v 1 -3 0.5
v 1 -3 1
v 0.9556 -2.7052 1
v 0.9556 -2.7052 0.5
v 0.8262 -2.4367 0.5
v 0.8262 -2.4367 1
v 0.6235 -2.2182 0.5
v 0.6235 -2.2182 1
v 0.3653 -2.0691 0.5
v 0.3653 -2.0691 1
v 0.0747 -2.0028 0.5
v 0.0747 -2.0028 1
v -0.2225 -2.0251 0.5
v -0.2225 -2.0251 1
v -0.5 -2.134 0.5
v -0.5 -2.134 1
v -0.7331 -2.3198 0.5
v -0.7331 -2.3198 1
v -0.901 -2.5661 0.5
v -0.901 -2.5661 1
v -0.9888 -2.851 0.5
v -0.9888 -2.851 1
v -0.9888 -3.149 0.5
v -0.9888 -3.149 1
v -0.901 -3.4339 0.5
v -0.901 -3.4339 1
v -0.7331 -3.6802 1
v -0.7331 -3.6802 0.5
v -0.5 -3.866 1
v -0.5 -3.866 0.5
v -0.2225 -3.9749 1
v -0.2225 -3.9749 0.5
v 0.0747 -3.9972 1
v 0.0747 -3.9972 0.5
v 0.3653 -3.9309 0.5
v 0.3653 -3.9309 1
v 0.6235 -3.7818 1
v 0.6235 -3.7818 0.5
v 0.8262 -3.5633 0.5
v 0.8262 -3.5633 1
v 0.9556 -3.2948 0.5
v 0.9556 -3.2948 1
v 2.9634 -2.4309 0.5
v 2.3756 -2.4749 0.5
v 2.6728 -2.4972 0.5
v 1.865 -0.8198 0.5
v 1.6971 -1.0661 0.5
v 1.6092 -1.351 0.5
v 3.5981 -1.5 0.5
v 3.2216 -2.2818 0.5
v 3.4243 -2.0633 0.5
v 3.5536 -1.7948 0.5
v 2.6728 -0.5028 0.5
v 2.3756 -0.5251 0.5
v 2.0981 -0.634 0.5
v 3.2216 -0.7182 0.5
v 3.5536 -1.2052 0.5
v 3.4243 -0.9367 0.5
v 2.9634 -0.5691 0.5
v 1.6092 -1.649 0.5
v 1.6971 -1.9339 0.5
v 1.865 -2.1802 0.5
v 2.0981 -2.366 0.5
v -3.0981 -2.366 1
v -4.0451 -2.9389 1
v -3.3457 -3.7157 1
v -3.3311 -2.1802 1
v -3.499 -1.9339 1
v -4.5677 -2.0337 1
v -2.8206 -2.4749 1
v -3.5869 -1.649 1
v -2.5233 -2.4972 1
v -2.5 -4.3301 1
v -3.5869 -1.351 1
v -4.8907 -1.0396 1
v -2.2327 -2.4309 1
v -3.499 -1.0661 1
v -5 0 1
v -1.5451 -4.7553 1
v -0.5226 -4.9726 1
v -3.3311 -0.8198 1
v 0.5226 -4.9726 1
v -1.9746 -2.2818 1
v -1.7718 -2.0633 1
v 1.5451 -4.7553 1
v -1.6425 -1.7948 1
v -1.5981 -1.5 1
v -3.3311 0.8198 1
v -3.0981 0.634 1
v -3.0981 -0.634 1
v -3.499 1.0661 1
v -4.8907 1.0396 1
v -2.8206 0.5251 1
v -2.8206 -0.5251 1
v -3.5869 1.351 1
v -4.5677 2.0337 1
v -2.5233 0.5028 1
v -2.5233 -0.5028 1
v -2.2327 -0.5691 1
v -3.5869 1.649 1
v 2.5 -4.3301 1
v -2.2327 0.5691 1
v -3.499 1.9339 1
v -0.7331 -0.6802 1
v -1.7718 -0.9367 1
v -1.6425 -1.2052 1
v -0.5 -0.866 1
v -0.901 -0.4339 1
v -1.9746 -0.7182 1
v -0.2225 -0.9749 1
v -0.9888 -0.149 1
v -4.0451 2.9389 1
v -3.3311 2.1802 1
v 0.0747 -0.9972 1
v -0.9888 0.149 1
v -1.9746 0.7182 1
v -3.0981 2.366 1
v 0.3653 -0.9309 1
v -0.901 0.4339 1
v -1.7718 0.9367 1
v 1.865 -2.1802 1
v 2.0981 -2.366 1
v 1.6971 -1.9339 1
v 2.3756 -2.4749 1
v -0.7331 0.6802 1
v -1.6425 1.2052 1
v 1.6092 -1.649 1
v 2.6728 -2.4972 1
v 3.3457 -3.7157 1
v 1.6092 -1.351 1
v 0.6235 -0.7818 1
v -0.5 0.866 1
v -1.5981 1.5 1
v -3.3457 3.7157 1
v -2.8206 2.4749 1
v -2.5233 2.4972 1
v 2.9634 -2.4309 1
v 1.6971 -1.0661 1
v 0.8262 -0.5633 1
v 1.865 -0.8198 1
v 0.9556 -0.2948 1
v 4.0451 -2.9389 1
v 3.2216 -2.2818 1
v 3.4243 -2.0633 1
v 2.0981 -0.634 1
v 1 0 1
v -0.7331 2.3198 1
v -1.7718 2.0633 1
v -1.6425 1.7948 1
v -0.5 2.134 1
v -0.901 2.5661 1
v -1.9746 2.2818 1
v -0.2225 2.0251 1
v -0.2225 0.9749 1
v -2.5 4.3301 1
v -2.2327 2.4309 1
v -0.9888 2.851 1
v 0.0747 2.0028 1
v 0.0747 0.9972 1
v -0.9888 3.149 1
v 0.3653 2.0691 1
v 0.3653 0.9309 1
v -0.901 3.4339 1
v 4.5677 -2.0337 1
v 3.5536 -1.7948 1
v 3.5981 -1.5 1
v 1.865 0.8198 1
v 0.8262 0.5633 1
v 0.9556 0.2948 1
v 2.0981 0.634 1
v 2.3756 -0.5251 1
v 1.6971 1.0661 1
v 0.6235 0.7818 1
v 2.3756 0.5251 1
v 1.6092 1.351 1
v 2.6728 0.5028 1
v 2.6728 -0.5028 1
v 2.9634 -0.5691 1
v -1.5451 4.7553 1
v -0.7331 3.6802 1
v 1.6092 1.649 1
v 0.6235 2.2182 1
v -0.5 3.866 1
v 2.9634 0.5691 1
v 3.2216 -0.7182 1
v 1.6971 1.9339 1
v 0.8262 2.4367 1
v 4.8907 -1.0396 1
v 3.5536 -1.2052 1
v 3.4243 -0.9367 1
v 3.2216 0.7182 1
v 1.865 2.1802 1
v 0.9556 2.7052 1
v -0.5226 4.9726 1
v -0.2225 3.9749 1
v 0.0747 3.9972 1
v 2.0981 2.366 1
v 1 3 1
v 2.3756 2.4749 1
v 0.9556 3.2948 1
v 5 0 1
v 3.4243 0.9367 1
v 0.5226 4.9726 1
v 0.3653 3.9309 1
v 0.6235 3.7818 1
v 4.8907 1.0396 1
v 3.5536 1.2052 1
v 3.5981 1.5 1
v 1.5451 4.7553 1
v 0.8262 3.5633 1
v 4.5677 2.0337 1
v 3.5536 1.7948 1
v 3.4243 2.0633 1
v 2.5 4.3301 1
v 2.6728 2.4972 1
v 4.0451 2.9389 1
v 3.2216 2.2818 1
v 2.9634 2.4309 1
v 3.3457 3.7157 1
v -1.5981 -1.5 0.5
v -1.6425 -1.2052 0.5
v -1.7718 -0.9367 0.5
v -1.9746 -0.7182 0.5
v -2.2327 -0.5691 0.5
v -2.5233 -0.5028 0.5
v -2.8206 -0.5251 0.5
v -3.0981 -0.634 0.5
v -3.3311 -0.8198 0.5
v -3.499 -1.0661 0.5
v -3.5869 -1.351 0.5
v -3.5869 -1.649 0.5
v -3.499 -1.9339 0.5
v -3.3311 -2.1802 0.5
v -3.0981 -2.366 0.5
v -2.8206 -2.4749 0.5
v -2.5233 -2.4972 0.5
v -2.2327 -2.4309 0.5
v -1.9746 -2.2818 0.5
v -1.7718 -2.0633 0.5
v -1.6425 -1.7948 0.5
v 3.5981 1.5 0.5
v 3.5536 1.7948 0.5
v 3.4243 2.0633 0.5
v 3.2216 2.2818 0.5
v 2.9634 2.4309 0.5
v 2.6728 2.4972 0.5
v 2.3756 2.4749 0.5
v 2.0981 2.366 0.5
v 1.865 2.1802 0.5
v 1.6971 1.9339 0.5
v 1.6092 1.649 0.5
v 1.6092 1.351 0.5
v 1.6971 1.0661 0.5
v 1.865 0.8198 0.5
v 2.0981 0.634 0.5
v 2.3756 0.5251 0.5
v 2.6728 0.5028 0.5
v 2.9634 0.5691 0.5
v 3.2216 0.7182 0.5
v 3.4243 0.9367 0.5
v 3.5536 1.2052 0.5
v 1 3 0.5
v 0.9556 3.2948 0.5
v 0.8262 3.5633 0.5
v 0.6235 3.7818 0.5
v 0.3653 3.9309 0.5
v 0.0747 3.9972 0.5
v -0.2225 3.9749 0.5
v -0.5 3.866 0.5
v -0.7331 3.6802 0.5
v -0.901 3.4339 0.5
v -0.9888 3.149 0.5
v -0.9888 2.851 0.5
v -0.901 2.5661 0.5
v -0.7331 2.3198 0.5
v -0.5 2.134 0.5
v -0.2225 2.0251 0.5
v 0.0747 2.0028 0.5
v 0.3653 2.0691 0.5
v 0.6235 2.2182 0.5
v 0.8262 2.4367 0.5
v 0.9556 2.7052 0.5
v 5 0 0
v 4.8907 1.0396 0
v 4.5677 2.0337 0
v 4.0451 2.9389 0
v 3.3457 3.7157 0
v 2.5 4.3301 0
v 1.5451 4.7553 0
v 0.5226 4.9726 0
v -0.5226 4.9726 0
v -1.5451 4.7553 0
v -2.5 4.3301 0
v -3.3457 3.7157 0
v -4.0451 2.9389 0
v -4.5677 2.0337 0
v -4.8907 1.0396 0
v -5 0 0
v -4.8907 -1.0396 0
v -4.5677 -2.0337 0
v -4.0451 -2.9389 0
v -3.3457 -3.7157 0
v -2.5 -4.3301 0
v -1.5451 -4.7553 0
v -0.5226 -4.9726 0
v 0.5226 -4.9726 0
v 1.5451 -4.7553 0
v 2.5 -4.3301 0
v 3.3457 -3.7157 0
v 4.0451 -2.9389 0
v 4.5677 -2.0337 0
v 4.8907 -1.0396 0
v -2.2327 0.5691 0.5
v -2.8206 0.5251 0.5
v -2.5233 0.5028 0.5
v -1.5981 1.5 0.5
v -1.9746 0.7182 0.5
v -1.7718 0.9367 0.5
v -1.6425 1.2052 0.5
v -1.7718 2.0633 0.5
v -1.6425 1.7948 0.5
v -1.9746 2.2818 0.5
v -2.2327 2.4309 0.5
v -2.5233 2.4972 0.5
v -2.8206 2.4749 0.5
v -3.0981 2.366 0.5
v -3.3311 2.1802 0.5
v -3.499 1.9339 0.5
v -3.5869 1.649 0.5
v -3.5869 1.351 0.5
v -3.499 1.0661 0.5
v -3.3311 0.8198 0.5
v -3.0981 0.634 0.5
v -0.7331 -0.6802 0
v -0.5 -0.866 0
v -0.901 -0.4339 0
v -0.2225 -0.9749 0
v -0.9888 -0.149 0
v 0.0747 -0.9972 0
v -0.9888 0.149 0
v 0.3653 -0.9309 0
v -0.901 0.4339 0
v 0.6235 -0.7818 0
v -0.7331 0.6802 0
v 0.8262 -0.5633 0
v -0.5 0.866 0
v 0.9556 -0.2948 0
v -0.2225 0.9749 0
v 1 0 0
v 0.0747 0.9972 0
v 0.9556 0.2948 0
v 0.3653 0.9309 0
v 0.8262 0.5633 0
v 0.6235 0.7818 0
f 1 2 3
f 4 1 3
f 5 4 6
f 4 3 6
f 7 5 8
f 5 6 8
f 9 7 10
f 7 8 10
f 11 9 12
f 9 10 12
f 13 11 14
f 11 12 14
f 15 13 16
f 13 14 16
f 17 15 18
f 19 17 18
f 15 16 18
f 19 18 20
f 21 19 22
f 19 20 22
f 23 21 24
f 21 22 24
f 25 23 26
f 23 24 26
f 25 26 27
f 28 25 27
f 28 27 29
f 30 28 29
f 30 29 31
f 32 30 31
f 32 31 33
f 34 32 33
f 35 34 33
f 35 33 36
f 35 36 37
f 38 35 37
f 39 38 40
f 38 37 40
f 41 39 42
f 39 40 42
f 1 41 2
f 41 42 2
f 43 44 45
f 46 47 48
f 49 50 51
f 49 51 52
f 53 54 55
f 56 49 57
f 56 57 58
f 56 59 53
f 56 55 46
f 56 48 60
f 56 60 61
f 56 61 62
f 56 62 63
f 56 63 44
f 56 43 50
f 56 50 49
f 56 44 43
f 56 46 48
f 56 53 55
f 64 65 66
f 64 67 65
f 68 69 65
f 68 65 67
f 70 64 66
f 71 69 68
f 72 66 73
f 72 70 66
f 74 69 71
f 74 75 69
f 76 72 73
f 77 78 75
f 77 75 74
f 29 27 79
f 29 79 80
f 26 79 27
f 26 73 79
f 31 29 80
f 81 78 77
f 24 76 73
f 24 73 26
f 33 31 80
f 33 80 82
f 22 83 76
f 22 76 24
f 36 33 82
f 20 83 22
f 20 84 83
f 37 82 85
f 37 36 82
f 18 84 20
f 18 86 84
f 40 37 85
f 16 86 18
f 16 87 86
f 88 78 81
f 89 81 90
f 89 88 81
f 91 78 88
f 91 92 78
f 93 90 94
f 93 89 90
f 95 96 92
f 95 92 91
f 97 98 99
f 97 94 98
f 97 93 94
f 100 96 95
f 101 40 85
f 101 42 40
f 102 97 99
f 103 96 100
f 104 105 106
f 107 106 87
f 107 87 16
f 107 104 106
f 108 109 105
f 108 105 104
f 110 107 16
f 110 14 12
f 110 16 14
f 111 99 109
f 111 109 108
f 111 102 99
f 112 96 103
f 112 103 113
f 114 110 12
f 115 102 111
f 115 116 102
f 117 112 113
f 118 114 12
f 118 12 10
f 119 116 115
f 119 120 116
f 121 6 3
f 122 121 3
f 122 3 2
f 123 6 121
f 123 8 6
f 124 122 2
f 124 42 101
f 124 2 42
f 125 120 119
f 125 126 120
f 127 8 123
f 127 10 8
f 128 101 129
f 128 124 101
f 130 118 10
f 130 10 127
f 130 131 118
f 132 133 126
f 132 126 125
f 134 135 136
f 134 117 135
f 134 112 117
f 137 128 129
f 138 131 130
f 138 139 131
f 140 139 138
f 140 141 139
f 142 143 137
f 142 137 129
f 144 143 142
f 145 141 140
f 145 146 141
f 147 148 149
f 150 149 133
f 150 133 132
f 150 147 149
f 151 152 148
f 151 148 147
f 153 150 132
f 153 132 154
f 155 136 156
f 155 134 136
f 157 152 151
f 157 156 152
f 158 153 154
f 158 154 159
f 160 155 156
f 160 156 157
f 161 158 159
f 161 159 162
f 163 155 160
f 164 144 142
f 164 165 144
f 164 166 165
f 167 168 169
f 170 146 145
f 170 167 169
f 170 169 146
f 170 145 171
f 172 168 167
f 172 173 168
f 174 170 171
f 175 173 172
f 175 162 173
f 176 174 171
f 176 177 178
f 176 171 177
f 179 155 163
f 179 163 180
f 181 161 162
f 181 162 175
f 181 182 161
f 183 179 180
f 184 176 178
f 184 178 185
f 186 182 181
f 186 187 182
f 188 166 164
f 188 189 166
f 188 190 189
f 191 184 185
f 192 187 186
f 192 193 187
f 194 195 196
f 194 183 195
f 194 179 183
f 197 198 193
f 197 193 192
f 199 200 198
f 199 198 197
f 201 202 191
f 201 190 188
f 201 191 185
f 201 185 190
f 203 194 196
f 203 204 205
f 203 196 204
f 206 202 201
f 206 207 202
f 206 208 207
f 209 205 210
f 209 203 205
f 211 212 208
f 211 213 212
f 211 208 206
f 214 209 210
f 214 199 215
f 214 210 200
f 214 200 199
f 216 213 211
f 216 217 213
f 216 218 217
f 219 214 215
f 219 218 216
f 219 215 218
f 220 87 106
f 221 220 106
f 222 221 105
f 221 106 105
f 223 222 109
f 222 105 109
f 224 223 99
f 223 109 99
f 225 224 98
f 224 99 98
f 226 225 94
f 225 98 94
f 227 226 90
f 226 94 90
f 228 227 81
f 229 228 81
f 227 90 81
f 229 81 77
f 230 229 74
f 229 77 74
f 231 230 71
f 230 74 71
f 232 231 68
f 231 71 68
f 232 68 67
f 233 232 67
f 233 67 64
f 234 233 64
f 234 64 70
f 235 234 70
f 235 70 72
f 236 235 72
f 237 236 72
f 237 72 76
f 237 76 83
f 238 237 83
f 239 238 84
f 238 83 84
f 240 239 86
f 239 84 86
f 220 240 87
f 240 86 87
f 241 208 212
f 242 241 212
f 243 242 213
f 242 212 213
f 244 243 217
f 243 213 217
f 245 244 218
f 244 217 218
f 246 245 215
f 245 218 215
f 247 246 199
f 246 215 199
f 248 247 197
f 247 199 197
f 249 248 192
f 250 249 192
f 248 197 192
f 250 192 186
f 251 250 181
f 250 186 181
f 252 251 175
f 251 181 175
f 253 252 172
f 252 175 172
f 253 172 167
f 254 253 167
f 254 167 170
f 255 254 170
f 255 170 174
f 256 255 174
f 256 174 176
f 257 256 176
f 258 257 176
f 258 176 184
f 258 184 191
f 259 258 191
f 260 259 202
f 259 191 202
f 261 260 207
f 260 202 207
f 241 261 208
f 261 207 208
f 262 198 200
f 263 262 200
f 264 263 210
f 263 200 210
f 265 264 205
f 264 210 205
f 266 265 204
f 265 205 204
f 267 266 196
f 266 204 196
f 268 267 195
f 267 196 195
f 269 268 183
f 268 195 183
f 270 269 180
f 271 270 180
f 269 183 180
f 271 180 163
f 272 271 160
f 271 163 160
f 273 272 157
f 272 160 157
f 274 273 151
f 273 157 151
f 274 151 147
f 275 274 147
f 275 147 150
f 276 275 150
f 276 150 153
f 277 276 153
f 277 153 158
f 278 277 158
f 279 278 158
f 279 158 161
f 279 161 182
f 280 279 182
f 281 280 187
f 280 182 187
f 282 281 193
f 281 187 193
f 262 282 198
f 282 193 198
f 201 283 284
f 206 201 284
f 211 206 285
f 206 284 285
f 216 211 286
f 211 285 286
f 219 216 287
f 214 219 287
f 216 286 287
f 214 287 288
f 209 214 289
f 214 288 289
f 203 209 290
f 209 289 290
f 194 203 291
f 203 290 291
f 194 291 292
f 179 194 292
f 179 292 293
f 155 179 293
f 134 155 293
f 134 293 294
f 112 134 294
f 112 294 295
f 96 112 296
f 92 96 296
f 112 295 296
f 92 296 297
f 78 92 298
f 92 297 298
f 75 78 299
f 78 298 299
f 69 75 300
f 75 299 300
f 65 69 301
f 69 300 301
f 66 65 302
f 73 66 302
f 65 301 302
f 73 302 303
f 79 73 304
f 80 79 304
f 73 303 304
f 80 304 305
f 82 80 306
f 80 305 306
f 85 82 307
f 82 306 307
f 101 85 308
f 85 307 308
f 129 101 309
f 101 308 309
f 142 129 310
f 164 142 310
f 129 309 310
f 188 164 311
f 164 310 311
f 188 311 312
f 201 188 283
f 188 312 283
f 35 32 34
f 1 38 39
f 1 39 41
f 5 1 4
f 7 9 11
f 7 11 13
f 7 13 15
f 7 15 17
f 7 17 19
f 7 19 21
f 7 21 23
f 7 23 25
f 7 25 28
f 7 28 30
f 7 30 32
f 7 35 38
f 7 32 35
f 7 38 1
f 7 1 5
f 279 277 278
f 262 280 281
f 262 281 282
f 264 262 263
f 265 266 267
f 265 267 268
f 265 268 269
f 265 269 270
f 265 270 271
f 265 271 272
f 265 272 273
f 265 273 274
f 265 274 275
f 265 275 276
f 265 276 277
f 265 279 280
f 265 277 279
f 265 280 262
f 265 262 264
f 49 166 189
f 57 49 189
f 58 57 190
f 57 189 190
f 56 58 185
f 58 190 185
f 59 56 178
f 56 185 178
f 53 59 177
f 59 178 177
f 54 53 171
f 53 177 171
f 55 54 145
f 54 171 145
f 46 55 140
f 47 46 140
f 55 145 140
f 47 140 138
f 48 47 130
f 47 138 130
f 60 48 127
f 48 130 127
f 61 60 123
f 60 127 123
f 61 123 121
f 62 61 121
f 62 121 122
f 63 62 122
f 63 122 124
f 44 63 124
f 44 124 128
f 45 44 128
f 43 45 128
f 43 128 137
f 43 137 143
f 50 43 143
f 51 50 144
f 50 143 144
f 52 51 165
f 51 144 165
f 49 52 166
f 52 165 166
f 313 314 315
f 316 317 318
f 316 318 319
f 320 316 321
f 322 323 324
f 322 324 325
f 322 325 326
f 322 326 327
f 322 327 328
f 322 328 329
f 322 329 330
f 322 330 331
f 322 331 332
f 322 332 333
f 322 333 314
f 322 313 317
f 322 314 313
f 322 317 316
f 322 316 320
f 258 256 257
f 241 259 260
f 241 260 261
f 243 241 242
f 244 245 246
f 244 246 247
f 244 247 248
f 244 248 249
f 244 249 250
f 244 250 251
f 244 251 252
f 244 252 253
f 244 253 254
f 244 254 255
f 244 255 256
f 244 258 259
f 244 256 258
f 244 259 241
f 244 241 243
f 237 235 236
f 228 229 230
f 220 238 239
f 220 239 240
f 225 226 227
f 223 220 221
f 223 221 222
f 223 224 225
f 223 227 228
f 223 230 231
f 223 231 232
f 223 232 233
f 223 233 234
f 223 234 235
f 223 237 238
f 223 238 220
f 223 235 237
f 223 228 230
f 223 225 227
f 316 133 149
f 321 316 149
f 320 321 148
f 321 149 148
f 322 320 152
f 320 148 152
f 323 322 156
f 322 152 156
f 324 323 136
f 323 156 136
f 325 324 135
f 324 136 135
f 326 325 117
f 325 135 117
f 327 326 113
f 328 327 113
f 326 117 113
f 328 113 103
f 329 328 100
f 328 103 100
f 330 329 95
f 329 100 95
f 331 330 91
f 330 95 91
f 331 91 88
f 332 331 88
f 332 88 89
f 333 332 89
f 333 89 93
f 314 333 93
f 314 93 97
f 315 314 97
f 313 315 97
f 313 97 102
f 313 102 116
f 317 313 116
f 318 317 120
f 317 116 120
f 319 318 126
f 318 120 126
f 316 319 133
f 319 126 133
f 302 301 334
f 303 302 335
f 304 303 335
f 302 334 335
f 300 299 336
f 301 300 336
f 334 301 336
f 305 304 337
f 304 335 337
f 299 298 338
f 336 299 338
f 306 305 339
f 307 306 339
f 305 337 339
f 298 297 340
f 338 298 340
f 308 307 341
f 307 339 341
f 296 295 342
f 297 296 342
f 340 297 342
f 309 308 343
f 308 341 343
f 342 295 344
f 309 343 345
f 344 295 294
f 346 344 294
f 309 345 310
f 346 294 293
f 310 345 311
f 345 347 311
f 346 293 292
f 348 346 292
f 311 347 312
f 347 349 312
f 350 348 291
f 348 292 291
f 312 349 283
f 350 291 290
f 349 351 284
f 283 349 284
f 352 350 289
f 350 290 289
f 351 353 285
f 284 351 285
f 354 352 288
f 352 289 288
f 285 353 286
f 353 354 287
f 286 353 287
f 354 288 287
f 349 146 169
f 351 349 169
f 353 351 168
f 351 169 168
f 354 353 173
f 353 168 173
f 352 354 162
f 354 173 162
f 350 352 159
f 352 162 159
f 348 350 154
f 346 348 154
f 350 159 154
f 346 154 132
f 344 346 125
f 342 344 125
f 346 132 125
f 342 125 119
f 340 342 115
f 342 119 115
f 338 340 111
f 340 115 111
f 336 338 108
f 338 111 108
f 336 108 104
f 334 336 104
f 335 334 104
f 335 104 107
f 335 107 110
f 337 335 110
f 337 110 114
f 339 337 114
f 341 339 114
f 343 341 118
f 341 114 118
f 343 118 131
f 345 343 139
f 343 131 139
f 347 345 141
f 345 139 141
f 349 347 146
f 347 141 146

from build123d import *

# Parameters (mm, degrees)
F0_R     = 5
F1_DEPTH = 1
F2_R     = 1
F3_DEPTH = 0.5
F4_R     = 1
F5_DEPTH = 1


with BuildPart() as f1:
    # F0 (on Top) → F1 (new body)
    with BuildSketch(Plane.XY):
        Circle(F0_R)
    extrude(amount=F1_DEPTH)

    # F2 (on face) → F3 (cut)
    with BuildSketch(Plane.XY.offset(1)):
        with Locations((0, 3)):
            Circle(F2_R)
        with Locations((-2.598076, 1.5)):
            Circle(F2_R)
        with Locations((-2.598076, -1.5)):
            Circle(F2_R)
        with Locations((0, -3)):
            Circle(F2_R)
        with Locations((2.598076, -1.5)):
            Circle(F2_R)
        with Locations((2.598076, 1.5)):
            Circle(F2_R)
    extrude(amount=-F3_DEPTH, mode=Mode.SUBTRACT)

    # F4 (on face) → F5 (cut)
    with BuildSketch(Plane.XY.offset(1)):
        Circle(F4_R)
    extrude(amount=-F5_DEPTH, mode=Mode.SUBTRACT)


solid = f1.part
